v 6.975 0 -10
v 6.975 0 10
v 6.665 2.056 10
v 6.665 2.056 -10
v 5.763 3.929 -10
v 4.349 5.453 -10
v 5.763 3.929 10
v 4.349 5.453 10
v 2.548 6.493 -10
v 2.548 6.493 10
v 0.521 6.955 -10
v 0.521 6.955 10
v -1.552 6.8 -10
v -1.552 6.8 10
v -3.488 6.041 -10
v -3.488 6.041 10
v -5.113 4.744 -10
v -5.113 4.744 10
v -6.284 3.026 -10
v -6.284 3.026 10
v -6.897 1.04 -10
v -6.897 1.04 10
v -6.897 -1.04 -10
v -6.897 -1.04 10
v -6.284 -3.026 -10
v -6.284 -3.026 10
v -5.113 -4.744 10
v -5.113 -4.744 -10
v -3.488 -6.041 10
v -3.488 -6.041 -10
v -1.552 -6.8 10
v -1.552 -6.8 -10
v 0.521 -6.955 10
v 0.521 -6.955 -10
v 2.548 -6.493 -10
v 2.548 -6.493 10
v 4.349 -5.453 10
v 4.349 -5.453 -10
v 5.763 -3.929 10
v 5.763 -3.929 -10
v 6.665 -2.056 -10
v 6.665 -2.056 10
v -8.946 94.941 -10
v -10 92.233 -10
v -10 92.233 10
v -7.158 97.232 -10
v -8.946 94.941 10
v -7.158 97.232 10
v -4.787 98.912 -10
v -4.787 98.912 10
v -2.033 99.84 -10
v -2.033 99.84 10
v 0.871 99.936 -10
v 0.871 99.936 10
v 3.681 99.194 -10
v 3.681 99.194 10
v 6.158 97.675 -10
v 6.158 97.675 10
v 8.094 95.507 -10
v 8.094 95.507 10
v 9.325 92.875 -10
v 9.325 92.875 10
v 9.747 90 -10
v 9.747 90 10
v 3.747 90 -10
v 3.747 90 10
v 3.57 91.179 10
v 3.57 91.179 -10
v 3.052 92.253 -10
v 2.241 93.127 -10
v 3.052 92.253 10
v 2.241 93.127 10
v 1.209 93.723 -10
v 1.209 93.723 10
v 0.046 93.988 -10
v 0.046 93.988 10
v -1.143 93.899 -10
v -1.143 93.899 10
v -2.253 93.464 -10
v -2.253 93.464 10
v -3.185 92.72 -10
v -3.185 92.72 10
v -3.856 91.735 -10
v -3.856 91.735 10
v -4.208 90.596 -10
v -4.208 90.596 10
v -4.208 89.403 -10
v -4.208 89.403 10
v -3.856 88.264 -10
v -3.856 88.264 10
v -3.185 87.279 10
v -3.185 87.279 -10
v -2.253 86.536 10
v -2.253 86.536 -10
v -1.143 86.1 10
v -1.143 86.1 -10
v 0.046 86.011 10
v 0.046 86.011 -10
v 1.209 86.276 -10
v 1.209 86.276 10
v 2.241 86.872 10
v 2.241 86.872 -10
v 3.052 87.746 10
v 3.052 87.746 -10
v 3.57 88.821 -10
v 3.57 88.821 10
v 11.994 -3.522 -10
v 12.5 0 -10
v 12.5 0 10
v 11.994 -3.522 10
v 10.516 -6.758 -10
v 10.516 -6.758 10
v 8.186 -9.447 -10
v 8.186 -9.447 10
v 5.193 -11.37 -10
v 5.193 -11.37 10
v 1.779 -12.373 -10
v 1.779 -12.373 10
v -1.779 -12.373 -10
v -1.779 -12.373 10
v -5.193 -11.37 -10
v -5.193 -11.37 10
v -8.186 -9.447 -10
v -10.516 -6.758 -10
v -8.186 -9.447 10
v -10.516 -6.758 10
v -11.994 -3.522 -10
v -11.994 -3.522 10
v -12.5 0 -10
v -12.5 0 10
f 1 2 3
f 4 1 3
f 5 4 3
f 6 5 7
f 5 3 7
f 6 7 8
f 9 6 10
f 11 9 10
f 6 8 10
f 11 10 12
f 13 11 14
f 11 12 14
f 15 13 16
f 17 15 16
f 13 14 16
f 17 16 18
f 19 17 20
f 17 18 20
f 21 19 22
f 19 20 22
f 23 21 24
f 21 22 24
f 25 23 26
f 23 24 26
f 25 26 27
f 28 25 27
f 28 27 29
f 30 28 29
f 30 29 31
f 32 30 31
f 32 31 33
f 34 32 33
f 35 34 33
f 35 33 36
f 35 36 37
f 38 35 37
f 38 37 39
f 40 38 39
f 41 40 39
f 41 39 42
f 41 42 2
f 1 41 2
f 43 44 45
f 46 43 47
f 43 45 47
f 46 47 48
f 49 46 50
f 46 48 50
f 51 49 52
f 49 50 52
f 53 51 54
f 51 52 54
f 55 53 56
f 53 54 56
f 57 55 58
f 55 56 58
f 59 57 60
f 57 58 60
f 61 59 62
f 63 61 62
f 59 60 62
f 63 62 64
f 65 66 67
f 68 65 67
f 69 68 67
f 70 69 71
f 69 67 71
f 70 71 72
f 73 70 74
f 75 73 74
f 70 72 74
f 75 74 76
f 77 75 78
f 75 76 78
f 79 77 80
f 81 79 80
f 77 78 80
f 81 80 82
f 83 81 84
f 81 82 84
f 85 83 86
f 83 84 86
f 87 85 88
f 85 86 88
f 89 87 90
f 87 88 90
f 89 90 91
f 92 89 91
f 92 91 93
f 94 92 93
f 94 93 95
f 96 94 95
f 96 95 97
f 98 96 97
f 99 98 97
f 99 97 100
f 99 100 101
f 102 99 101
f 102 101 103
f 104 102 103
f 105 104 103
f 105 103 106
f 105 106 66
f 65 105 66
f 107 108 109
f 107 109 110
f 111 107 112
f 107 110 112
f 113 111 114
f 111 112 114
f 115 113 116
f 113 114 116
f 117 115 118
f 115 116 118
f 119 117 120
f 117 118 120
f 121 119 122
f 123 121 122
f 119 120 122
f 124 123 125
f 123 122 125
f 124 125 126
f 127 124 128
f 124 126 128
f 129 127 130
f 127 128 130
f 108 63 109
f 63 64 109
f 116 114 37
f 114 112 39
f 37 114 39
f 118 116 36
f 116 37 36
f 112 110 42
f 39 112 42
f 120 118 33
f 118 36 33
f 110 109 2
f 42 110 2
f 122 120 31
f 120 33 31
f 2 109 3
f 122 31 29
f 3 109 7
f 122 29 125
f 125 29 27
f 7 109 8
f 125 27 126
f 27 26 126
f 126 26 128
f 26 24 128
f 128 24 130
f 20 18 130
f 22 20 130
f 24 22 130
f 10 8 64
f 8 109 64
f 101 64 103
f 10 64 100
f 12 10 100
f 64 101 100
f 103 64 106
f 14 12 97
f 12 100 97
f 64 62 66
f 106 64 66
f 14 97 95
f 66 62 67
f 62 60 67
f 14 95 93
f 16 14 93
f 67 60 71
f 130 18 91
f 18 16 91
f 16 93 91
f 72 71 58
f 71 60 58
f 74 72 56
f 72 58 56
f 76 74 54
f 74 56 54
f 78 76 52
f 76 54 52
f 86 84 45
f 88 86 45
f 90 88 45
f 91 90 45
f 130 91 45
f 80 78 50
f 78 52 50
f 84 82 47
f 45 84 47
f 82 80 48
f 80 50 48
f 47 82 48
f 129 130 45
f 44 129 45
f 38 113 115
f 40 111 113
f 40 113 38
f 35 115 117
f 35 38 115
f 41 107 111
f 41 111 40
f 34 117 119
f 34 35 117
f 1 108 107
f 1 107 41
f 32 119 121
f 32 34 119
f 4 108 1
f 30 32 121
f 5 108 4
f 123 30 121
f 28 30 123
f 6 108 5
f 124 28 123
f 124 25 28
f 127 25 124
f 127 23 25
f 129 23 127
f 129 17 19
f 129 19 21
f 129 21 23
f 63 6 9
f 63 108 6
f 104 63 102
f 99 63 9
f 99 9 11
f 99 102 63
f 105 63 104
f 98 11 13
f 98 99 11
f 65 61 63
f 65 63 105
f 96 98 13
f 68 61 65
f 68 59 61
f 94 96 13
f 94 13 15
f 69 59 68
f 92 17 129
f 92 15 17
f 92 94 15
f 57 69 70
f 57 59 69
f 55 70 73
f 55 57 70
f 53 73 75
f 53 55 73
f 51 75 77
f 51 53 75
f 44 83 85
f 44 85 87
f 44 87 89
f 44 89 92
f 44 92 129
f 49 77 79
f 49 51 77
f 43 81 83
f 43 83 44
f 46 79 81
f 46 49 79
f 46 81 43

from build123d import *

# Parameters (mm, degrees)
EXTRUDE1_DEPTH     = 10
SKETCH6_R          = 4
CUT_EXTRUDE1_DEPTH = 21
SKETCH8_R          = 6.975
CUT_EXTRUDE2_DEPTH = 21


with BuildPart() as part:
    # Sketch2 → Extrude1 (new body, symmetric)
    with BuildSketch(Plane.XY):
        with BuildLine():
            Line((-12.5, 0), (-10, 92.232909937))
            ThreePointArc((-10, 92.232909937), (0.871187265, 99.936304296), (9.747437125, 89.999645621))
            Line((9.747437125, 89.999645621), (12.5, 0))
            ThreePointArc((12.5, 0), (0, -12.5), (-12.5, 0))
        make_face()
    extrude(amount=EXTRUDE1_DEPTH, both=True)

    # Sketch6 → Cut-Extrude1 (cut, through all)
    with BuildSketch(Plane.XY.offset(10)):
        with Locations((-0.252562875, 89.999645621)):
            Circle(SKETCH6_R)
    extrude(amount=-CUT_EXTRUDE1_DEPTH, mode=Mode.SUBTRACT)

    # Sketch8 → Cut-Extrude2 (cut, through all)
    with BuildSketch(Plane.XY.offset(10)):
        Circle(SKETCH8_R)
    extrude(amount=-CUT_EXTRUDE2_DEPTH, mode=Mode.SUBTRACT)


solid = part.part
